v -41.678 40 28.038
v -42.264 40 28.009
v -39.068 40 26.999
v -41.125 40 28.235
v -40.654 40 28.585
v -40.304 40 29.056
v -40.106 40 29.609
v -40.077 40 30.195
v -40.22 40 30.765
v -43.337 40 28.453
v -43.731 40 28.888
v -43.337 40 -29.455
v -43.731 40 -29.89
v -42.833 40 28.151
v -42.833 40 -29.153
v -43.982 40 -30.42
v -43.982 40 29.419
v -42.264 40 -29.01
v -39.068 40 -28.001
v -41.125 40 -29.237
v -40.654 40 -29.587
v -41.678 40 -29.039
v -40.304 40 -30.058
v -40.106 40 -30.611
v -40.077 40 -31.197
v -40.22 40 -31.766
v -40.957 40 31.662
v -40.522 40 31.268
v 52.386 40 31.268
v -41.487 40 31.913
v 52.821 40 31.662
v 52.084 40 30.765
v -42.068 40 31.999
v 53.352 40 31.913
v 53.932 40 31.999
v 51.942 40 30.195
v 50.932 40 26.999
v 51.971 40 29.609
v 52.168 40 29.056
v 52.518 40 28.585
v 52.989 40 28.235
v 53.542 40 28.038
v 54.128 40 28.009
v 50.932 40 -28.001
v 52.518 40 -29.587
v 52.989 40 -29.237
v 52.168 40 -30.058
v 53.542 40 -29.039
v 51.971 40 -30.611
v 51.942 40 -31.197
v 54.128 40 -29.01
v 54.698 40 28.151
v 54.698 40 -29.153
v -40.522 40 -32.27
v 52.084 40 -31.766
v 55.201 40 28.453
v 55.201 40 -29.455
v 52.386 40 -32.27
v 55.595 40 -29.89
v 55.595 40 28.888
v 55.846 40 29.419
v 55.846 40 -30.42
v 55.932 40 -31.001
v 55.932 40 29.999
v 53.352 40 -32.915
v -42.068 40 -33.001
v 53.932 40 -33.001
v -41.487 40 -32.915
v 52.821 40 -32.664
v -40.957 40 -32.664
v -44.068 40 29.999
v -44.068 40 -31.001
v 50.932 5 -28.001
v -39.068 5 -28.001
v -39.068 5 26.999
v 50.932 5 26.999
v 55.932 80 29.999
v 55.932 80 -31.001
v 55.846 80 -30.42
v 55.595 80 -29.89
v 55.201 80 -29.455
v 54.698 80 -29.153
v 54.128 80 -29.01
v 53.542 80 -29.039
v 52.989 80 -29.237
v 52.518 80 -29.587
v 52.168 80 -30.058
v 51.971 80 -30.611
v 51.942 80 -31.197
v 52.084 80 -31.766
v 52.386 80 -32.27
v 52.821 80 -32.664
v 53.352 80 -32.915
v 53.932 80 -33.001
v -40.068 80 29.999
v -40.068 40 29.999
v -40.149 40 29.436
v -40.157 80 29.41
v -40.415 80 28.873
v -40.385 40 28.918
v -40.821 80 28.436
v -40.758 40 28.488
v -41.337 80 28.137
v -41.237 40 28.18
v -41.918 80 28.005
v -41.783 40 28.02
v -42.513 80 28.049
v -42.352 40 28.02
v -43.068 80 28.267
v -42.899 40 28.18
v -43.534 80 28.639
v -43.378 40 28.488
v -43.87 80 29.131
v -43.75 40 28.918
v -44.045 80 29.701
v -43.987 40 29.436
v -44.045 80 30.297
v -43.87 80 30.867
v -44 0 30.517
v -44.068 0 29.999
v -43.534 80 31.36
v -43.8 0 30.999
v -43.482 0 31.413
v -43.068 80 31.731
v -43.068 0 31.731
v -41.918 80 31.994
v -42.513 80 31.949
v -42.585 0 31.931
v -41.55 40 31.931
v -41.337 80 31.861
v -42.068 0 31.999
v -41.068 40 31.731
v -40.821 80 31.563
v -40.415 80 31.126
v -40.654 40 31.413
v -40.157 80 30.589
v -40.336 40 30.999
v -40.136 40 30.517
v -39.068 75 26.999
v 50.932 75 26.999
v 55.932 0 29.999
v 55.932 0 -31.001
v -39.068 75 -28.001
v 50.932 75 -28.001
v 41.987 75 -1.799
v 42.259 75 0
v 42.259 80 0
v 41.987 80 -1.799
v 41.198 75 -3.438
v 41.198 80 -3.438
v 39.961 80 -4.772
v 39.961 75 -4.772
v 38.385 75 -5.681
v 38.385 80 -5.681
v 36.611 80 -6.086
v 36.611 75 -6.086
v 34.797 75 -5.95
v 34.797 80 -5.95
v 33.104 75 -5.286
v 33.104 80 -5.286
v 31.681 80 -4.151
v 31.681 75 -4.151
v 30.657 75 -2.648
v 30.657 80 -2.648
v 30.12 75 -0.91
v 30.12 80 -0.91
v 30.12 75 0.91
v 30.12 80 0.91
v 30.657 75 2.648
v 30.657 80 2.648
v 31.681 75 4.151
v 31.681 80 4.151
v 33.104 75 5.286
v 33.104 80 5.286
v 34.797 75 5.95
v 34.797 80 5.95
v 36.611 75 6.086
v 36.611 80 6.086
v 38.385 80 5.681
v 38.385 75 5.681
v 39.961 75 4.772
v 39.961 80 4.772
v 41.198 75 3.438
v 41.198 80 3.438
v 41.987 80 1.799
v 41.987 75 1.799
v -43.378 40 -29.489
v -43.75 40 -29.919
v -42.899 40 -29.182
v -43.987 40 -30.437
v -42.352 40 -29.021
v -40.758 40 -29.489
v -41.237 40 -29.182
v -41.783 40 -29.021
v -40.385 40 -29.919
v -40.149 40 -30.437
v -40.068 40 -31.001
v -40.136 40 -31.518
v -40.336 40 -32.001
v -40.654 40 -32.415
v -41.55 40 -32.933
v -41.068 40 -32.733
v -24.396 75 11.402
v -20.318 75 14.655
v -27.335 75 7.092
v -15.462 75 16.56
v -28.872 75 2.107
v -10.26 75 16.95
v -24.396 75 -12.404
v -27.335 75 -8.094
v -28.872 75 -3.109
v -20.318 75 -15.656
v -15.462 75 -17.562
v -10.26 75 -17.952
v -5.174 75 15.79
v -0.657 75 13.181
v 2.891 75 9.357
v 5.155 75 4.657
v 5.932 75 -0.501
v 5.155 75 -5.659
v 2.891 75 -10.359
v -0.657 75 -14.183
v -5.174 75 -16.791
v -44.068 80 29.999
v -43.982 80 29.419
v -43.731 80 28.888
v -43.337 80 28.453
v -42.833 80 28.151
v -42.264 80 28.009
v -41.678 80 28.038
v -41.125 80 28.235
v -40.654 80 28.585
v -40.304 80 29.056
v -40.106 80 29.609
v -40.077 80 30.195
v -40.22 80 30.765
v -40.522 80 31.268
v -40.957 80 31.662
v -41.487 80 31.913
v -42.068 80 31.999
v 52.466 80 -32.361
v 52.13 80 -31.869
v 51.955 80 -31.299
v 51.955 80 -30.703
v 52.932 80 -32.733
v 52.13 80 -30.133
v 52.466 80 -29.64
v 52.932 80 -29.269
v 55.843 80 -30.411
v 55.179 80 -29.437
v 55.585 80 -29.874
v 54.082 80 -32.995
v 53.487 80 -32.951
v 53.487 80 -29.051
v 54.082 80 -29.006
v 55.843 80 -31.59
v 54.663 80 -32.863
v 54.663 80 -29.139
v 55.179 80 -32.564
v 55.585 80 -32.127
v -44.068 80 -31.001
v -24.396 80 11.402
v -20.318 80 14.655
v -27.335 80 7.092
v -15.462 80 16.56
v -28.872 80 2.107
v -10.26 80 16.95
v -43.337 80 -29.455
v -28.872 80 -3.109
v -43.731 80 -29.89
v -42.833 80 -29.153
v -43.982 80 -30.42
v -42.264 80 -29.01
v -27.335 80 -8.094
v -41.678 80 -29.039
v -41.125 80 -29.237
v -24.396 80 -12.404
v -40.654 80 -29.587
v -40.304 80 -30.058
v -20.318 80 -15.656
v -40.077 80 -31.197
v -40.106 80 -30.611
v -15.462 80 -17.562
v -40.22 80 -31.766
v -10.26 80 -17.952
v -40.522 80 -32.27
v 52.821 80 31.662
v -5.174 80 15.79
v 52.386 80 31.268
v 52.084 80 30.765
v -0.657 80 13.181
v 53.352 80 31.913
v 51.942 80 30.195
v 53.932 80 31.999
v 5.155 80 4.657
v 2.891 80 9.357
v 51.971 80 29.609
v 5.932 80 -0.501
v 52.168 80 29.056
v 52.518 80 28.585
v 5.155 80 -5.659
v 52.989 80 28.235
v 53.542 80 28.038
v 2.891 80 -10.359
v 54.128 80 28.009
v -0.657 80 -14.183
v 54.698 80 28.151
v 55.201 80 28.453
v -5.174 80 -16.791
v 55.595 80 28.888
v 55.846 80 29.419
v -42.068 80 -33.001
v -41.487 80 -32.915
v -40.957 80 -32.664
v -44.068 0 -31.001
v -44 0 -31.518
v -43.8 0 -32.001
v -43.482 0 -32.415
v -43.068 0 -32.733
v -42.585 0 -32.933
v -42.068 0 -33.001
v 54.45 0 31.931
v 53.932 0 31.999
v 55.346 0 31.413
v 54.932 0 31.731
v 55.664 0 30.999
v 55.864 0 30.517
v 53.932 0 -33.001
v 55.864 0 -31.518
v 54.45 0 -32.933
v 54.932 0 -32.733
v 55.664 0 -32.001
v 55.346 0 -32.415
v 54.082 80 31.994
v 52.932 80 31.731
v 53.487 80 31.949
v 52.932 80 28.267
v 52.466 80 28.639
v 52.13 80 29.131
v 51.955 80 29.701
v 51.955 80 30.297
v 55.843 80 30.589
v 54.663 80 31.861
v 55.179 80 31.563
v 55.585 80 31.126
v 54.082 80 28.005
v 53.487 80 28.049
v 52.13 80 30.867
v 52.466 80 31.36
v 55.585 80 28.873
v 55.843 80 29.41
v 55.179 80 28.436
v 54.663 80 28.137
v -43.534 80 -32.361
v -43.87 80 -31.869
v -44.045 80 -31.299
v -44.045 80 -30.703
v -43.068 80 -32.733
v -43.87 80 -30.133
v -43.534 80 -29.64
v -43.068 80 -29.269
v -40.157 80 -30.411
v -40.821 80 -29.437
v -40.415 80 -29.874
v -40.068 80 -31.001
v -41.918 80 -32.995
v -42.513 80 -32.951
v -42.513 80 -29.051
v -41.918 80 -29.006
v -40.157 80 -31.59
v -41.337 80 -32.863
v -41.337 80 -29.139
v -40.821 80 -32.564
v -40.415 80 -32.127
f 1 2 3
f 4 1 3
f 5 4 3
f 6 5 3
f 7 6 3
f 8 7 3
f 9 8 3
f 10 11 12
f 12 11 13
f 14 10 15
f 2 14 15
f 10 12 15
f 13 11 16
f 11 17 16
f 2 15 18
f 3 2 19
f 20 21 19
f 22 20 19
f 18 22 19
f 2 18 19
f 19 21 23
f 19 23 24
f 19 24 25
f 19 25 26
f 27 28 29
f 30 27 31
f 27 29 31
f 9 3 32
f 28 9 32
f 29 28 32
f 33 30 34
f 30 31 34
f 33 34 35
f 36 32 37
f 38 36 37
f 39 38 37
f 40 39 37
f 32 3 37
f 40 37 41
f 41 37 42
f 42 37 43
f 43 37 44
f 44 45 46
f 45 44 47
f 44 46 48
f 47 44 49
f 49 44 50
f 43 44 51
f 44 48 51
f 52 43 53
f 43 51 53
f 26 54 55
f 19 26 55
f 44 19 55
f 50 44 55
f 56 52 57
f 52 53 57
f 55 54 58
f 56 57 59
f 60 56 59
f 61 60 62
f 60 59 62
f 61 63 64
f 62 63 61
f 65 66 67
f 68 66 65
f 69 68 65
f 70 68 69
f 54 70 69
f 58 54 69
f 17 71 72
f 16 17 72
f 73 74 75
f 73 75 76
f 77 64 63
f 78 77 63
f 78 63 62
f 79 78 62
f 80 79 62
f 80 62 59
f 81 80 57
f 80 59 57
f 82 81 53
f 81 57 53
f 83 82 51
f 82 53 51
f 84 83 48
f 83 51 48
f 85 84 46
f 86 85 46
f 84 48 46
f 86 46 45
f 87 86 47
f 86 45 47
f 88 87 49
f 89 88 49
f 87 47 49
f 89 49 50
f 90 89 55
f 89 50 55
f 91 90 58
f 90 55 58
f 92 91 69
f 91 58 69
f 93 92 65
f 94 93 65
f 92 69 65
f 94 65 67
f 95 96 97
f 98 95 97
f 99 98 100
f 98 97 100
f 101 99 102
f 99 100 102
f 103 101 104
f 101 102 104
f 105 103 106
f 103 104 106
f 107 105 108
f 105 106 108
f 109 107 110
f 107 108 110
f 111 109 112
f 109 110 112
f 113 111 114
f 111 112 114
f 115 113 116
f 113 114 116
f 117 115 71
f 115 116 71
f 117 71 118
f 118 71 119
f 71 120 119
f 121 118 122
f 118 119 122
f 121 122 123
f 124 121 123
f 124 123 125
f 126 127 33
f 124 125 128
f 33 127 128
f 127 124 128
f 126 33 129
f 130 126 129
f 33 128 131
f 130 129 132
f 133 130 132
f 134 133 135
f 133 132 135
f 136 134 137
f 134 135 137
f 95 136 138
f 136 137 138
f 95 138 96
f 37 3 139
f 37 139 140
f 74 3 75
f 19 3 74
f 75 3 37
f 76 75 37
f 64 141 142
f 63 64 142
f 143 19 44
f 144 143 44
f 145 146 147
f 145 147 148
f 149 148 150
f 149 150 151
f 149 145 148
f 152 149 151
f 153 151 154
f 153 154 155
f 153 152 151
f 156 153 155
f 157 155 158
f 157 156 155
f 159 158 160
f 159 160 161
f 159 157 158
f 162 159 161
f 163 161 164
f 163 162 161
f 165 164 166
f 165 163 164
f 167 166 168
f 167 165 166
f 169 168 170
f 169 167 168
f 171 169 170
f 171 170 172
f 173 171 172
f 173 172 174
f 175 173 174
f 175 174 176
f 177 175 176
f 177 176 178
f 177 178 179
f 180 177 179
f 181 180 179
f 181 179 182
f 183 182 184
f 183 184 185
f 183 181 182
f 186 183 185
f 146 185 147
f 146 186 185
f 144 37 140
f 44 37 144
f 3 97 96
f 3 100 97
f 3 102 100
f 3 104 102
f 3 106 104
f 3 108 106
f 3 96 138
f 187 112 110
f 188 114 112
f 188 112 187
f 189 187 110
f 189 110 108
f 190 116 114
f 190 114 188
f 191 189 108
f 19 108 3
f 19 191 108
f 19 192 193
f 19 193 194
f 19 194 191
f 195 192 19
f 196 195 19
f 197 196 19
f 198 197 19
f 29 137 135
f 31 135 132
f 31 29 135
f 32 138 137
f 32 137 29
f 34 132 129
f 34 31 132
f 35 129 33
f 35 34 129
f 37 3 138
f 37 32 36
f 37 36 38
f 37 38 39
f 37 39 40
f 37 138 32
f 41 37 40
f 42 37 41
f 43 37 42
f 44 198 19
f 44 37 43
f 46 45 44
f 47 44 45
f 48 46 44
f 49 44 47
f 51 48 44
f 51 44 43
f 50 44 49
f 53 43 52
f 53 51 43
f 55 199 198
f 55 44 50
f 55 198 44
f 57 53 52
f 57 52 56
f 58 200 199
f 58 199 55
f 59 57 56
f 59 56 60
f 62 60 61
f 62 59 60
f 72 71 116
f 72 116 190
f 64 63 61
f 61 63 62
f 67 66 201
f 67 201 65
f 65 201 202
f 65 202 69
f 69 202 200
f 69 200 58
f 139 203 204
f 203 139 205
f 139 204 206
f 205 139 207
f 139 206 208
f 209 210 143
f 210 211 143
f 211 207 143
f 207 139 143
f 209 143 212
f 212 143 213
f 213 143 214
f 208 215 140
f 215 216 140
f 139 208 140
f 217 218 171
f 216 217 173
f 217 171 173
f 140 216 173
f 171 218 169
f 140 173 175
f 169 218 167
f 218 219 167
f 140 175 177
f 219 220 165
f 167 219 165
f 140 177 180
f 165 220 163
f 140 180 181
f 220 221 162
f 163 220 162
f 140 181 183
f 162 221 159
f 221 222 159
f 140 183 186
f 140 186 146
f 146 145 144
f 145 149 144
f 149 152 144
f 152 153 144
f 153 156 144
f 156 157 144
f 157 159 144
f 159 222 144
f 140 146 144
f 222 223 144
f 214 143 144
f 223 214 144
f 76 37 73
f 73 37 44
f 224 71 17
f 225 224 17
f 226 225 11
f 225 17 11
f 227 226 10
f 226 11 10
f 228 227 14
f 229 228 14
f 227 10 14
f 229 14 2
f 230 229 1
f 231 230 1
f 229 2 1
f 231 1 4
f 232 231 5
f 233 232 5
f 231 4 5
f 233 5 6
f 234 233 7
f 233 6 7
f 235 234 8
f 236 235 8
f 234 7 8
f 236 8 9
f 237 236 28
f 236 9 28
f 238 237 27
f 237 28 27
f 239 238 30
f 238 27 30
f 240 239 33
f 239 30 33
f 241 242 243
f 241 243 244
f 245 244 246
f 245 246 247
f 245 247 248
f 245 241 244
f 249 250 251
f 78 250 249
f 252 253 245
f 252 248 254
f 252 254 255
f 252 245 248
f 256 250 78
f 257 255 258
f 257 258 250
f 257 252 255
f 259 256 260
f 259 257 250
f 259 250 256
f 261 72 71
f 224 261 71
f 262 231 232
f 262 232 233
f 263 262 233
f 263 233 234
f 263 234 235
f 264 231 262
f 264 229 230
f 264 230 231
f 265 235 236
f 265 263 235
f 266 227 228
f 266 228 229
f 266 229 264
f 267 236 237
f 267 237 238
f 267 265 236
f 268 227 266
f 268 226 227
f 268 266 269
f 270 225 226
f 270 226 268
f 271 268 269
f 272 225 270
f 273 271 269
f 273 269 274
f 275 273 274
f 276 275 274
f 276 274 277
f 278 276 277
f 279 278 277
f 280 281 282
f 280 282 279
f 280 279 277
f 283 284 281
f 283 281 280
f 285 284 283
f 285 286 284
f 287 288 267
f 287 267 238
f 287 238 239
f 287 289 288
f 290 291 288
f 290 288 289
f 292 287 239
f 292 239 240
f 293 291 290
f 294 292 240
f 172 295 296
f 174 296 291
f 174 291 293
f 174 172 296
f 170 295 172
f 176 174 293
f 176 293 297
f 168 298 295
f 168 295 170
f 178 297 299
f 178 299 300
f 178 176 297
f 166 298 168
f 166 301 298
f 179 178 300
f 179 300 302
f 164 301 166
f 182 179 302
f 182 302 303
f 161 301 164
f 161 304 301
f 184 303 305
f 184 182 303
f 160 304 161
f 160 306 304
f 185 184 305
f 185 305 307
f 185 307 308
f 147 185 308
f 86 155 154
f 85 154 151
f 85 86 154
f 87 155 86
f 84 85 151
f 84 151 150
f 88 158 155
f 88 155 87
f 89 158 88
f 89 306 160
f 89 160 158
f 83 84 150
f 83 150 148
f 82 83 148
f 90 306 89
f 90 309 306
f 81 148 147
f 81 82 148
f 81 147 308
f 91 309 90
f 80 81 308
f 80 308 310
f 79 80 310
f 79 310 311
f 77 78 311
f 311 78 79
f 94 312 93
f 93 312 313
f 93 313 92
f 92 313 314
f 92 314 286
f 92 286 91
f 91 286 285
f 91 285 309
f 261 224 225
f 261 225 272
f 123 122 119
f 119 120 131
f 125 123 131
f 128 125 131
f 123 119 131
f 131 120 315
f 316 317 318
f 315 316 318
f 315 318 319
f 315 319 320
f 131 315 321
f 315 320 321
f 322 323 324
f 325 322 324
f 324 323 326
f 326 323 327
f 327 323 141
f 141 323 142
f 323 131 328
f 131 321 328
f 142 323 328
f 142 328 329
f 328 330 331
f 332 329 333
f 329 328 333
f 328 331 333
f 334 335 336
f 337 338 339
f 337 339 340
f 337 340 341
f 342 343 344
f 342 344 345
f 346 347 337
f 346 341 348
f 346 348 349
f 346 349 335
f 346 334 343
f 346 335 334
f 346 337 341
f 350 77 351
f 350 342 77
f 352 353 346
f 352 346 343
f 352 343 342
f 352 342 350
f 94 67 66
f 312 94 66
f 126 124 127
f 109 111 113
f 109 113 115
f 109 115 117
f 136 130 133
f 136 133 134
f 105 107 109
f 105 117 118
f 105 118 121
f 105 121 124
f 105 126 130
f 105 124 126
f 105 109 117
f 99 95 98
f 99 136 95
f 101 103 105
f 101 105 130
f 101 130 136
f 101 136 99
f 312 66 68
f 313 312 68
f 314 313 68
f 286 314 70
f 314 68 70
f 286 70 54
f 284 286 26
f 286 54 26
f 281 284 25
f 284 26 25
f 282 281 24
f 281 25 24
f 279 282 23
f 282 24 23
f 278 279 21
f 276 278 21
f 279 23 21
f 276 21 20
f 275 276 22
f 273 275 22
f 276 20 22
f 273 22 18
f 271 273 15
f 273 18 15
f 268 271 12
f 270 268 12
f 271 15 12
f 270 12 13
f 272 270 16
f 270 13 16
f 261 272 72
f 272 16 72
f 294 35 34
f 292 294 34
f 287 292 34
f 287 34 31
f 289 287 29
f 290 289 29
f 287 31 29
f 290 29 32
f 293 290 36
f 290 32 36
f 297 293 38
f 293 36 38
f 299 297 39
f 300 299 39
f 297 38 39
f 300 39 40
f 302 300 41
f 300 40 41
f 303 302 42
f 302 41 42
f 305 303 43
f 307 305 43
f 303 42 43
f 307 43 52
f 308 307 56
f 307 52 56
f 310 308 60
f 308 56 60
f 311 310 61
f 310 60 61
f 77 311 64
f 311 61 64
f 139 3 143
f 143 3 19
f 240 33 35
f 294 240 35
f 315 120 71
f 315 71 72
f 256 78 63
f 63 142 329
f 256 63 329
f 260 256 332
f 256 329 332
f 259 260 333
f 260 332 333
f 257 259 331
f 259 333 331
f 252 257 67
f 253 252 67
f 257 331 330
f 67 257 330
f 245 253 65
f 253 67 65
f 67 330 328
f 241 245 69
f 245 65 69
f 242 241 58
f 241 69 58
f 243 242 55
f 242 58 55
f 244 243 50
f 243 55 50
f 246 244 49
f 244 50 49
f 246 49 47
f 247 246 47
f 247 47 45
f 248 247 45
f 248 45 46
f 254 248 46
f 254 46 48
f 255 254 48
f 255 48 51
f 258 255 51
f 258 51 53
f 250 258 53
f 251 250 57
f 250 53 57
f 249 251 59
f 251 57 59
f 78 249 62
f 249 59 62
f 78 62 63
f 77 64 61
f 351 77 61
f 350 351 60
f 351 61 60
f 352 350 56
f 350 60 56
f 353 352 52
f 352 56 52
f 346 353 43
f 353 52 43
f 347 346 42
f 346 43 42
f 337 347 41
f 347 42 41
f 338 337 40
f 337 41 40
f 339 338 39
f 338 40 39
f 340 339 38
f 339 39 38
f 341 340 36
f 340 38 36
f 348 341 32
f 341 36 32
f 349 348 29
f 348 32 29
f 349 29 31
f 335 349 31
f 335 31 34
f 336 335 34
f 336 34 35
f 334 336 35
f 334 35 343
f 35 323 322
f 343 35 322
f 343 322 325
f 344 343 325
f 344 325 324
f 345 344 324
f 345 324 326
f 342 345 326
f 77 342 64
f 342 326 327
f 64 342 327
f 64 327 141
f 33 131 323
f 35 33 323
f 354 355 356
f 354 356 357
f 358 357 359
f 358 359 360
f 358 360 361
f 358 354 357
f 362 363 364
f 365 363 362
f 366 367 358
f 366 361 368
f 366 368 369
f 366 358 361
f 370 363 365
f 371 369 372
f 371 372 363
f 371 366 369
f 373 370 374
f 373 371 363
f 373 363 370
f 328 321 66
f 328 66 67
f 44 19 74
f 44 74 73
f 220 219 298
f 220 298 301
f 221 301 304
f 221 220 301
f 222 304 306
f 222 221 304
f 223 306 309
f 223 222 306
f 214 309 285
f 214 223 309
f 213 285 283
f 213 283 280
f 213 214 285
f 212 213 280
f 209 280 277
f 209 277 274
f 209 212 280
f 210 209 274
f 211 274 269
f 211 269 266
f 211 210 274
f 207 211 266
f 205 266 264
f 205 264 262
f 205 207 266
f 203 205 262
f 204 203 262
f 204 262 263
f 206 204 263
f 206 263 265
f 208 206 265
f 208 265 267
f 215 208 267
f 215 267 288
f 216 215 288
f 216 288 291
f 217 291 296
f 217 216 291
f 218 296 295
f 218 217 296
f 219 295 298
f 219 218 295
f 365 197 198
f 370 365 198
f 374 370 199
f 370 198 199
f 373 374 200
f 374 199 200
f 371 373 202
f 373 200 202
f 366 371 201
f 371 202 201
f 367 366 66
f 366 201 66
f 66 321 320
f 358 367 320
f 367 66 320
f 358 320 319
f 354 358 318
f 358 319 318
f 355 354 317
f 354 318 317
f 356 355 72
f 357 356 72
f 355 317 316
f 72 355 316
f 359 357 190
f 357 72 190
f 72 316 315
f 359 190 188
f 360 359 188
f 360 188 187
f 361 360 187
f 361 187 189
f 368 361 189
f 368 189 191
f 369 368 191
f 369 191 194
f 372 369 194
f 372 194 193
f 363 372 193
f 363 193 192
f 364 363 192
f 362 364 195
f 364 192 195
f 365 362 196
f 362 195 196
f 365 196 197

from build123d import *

# Parameters (mm, degrees)
SKETCH1_W             = 100
SKETCH1_H             = 65
BOSS_EXTRUDE1_DEPTH   = 80
SKETCH2_W             = 90
SKETCH2_H             = 55
CUT_EXTRUDE2_DEPTH    = 75
SKETCH4_W             = 90
SKETCH4_H             = 55
BOSS_EXTRUDE2_DEPTH   = 5
SKETCH3_R             = 17.5
CUT_EXTRUDE3_DEPTH    = 5
SKETCH5_R             = 6.10322586
CUT_EXTRUDE4_DEPTH    = 5
SPLIT1_START          = -1
SPLIT1_DEPTH          = 82
SPLIT1_2_OUTLINE_R    = 2
SPLIT1_2_DEPTH        = 80
SPLIT1_3_OUTLINE_R    = 2
SPLIT1_3_DEPTH        = 80
SPLIT1_4_OUTLINE_R    = 2
SPLIT1_4_DEPTH        = 80
SPLIT1_5_OUTLINE_R    = 2
SPLIT1_5_DEPTH        = 80
SPLIT1_6_DEPTH        = 80
SPLIT1_7_DEPTH        = 80
SPLIT1_8_DEPTH        = 80
SPLIT1_9_DEPTH        = 80
SPLIT2_START          = 40
SPLIT2_OUTLINE_W      = 90
SPLIT2_OUTLINE_H      = 55
SPLIT2_DEPTH          = 40
SPLIT2_START_2        = 75
SPLIT2_2_OUTLINE_W    = 90
SPLIT2_2_OUTLINE_H    = 55
SPLIT2_2_OUTLINE_R    = 6.10322586
SPLIT2_2_OUTLINE_R_2  = 17.5
SPLIT2_2_DEPTH        = 5
SPLIT2_3_OUTLINE_R    = 2
SPLIT2_3_DEPTH        = 40
SPLIT2_4_OUTLINE_R    = 2
SPLIT2_4_DEPTH        = 40
SPLIT2_5_OUTLINE_R    = 2
SPLIT2_5_DEPTH        = 40
SPLIT2_6_OUTLINE_R    = 2
SPLIT2_6_DEPTH        = 40
SPLIT2_7_OUTLINE_R    = 2
SPLIT2_7_DEPTH        = 40
SPLIT2_8_OUTLINE_R    = 2
SPLIT2_8_DEPTH        = 40
SPLIT2_9_OUTLINE_R    = 2
SPLIT2_9_DEPTH        = 40
SPLIT2_10_OUTLINE_R   = 2
SPLIT2_10_DEPTH       = 40
SPLIT2_11_OUTLINE_R   = 6.10322586
SPLIT2_11_OUTLINE_R_2 = 17.5
SPLIT2_11_DEPTH       = 40


with BuildPart() as part:
    # Sketch1 → Boss-Extrude1 (new body)
    with BuildSketch(Plane(origin=(0, 0, 0), x_dir=(1, 0, 0), z_dir=(0, 1, 0))):
        with Locations((5.93220339, 0.500770416)):
            Rectangle(SKETCH1_W, SKETCH1_H)
    extrude(amount=BOSS_EXTRUDE1_DEPTH)

    # Sketch2 → Cut-Extrude2 (cut)
    with BuildSketch(Plane(origin=(0, 80, 0), x_dir=(1, 0, 0), z_dir=(0, 1, 0))):
        with Locations((5.93220339, 0.500770416)):
            Rectangle(SKETCH2_W, SKETCH2_H)
    extrude(amount=-CUT_EXTRUDE2_DEPTH, mode=Mode.SUBTRACT)

    # Sketch4 → Boss-Extrude2 (add)
    with BuildSketch(Plane(origin=(0, 80, 0), x_dir=(1, 0, 0), z_dir=(0, 1, 0))):
        with Locations((5.93220339, 0.500770416)):
            Rectangle(SKETCH4_W, SKETCH4_H)
    extrude(amount=-BOSS_EXTRUDE2_DEPTH)

    # Sketch3 → Cut-Extrude3 (cut)
    with BuildSketch(Plane(origin=(0, 80, 0), x_dir=(1, 0, 0), z_dir=(0, 1, 0))):
        with Locations(Location((-11.56779661, 0.500770416, 0), (0, 0, 270))):
            Circle(SKETCH3_R)
    extrude(amount=-CUT_EXTRUDE3_DEPTH, mode=Mode.SUBTRACT)

    # Sketch5 → Cut-Extrude4 (cut)
    with BuildSketch(Plane(origin=(0, 80, 0), x_dir=(1, 0, 0), z_dir=(0, 1, 0))):
        with Locations(Location((36.155377847, 0, 0), (0, 0, 270))):
            Circle(SKETCH5_R)
    extrude(amount=-CUT_EXTRUDE4_DEPTH, mode=Mode.SUBTRACT)

    # Split1: read off the stored shape, not the designer's step
    # Split1 outline → Split1 (cut)
    with BuildSketch(Plane(origin=(0, 0, 0), x_dir=(1, 0, 0), z_dir=(0, 1, 0)).offset(SPLIT1_START)):
        with BuildLine():
            Line((-44.06779661, 33.000770416), (-44.06779661, 31.000770416))
            ThreePointArc((-44.06779661, 31.000770416), (-40.653583048, 29.586556854), (-42.06779661, 33.000770416))
            Line((-42.06779661, 33.000770416), (-44.06779661, 33.000770416))
        make_face()
        with BuildLine():
            ThreePointArc((-42.06779661, -31.999229584), (-40.653583048, -28.585016022), (-44.06779661, -29.999229584))
            Line((-44.06779661, -29.999229584), (-44.06779661, -31.999229584))
            Line((-44.06779661, -31.999229584), (-42.06779661, -31.999229584))
        make_face()
        with BuildLine():
            Line((55.93220339, 33.000770416), (53.93220339, 33.000770416))
            ThreePointArc((53.93220339, 33.000770416), (52.517989827, 29.586556854), (55.93220339, 31.000770416))
            Line((55.93220339, 31.000770416), (55.93220339, 33.000770416))
        make_face()
        with BuildLine():
            ThreePointArc((55.93220339, -29.999229584), (52.517989827, -28.585016021), (53.93220339, -31.999229584))
            Line((53.93220339, -31.999229584), (55.93220339, -31.999229584))
            Line((55.93220339, -31.999229584), (55.93220339, -29.999229584))
        make_face()
    extrude(amount=SPLIT1_DEPTH, mode=Mode.SUBTRACT)

    # Split2 11 outline → Split2 11 (cut)
    with BuildSketch(Plane(origin=(0, 0, 0), x_dir=(1, 0, 0), z_dir=(0, 1, 0)).offset(SPLIT2_START)):
        with BuildLine():
            ThreePointArc((-42.06779661, 33.000770416), (-40.653583048, 29.586556854), (-44.06779661, 31.000770416))
            Line((-44.06779661, 31.000770416), (-44.06779661, -29.999229584))
            ThreePointArc((-44.06779661, -29.999229584), (-40.653583048, -28.585016022), (-42.06779661, -31.999229584))
            Line((-42.06779661, -31.999229584), (53.93220339, -31.999229584))
            ThreePointArc((53.93220339, -31.999229584), (52.517989827, -28.585016021), (55.93220339, -29.999229584))
            Line((55.93220339, -29.999229584), (55.93220339, 31.000770416))
            ThreePointArc((55.93220339, 31.000770416), (52.517989827, 29.586556854), (53.93220339, 33.000770416))
            Line((53.93220339, 33.000770416), (-42.06779661, 33.000770416))
        make_face()
        with Locations((36.155377847, 0)):
            Circle(SPLIT2_11_OUTLINE_R, mode=Mode.SUBTRACT)
        with Locations((-11.56779661, 0.500770416)):
            Circle(SPLIT2_11_OUTLINE_R_2, mode=Mode.SUBTRACT)
    extrude(amount=SPLIT2_11_DEPTH, mode=Mode.SUBTRACT)


with BuildPart() as body_2:
    # Split1 2 outline → Split1 2 (new body)
    with BuildSketch(Plane(origin=(0, 0, 0), x_dir=(1, 0, 0), z_dir=(0, 1, 0))):
        with Locations((53.93220339, 31.000770416)):
            Circle(SPLIT1_2_OUTLINE_R)
    extrude(amount=SPLIT1_2_DEPTH)

    # Split2 9 outline → Split2 9 (cut)
    with BuildSketch(Plane(origin=(0, 0, 0), x_dir=(1, 0, 0), z_dir=(0, 1, 0))):
        with Locations((53.93220339, 31.000770416)):
            Circle(SPLIT2_9_OUTLINE_R)
    extrude(amount=SPLIT2_9_DEPTH, mode=Mode.SUBTRACT)


with BuildPart() as body_3:
    # Split1 3 outline → Split1 3 (new body)
    with BuildSketch(Plane(origin=(0, 0, 0), x_dir=(1, 0, 0), z_dir=(0, 1, 0))):
        with Locations((-42.06779661, -29.999229584)):
            Circle(SPLIT1_3_OUTLINE_R)
    extrude(amount=SPLIT1_3_DEPTH)

    # Split2 3 outline → Split2 3 (cut)
    with BuildSketch(Plane(origin=(0, 0, 0), x_dir=(1, 0, 0), z_dir=(0, 1, 0)).offset(SPLIT2_START)):
        with Locations((-42.06779661, -29.999229584)):
            Circle(SPLIT2_3_OUTLINE_R)
    extrude(amount=SPLIT2_3_DEPTH, mode=Mode.SUBTRACT)


with BuildPart() as body_4:
    # Split1 4 outline → Split1 4 (new body)
    with BuildSketch(Plane(origin=(0, 0, 0), x_dir=(1, 0, 0), z_dir=(0, 1, 0))):
        with Locations((53.93220339, -29.999229584)):
            Circle(SPLIT1_4_OUTLINE_R)
    extrude(amount=SPLIT1_4_DEPTH)

    # Split2 6 outline → Split2 6 (cut)
    with BuildSketch(Plane(origin=(0, 0, 0), x_dir=(1, 0, 0), z_dir=(0, 1, 0))):
        with Locations((53.93220339, -29.999229584)):
            Circle(SPLIT2_6_OUTLINE_R)
    extrude(amount=SPLIT2_6_DEPTH, mode=Mode.SUBTRACT)


with BuildPart() as body_5:
    # Split1 5 outline → Split1 5 (new body)
    with BuildSketch(Plane(origin=(0, 0, 0), x_dir=(1, 0, 0), z_dir=(0, 1, 0))):
        with Locations((-42.06779661, 31.000770416)):
            Circle(SPLIT1_5_OUTLINE_R)
    extrude(amount=SPLIT1_5_DEPTH)

    # Split2 4 outline → Split2 4 (cut)
    with BuildSketch(Plane(origin=(0, 0, 0), x_dir=(1, 0, 0), z_dir=(0, 1, 0))):
        with Locations((-42.06779661, 31.000770416)):
            Circle(SPLIT2_4_OUTLINE_R)
    extrude(amount=SPLIT2_4_DEPTH, mode=Mode.SUBTRACT)


with BuildPart() as body_6:
    # Split1 6 outline → Split1 6 (new body)
    with BuildSketch(Plane(origin=(0, 0, 0), x_dir=(1, 0, 0), z_dir=(0, 1, 0))):
        with BuildLine():
            ThreePointArc((-42.06779661, -31.999229584), (-43.482010173, -31.413443146), (-44.06779661, -29.999229584))
            Line((-44.06779661, -29.999229584), (-44.06779661, -31.999229584))
            Line((-44.06779661, -31.999229584), (-42.06779661, -31.999229584))
        make_face()
    extrude(amount=SPLIT1_6_DEPTH)


with BuildPart() as body_7:
    # Split1 7 outline → Split1 7 (new body)
    with BuildSketch(Plane(origin=(0, 0, 0), x_dir=(1, 0, 0), z_dir=(0, 1, 0))):
        with BuildLine():
            ThreePointArc((-44.06779661, 31.000770416), (-43.482010173, 32.414983978), (-42.06779661, 33.000770416))
            Line((-42.06779661, 33.000770416), (-44.06779661, 33.000770416))
            Line((-44.06779661, 33.000770416), (-44.06779661, 31.000770416))
        make_face()
    extrude(amount=SPLIT1_7_DEPTH)


with BuildPart() as body_8:
    # Split1 8 outline → Split1 8 (new body)
    with BuildSketch(Plane(origin=(0, 0, 0), x_dir=(1, 0, 0), z_dir=(0, 1, 0))):
        with BuildLine():
            ThreePointArc((55.93220339, -29.999229584), (55.346416952, -31.413443146), (53.93220339, -31.999229584))
            Line((53.93220339, -31.999229584), (55.93220339, -31.999229584))
            Line((55.93220339, -31.999229584), (55.93220339, -29.999229584))
        make_face()
    extrude(amount=SPLIT1_8_DEPTH)


with BuildPart() as body_9:
    # Split1 9 outline → Split1 9 (new body)
    with BuildSketch(Plane(origin=(0, 0, 0), x_dir=(1, 0, 0), z_dir=(0, 1, 0))):
        with BuildLine():
            ThreePointArc((53.93220339, 33.000770416), (55.346416952, 32.414983978), (55.93220339, 31.000770416))
            Line((55.93220339, 31.000770416), (55.93220339, 33.000770416))
            Line((55.93220339, 33.000770416), (53.93220339, 33.000770416))
        make_face()
    extrude(amount=SPLIT1_9_DEPTH)


with BuildPart() as body_6_2:
    # Split2: read off the stored shape, not the designer's step
    # Split2 outline → Split2 (new body)
    with BuildSketch(Plane(origin=(0, 0, 0), x_dir=(1, 0, 0), z_dir=(0, 1, 0)).offset(SPLIT2_START)):
        with BuildLine():
            Line((55.93220339, -29.999229584), (55.93220339, 31.000770416))
            ThreePointArc((55.93220339, 31.000770416), (52.517989827, 29.586556854), (53.93220339, 33.000770416))
            Line((53.93220339, 33.000770416), (-42.06779661, 33.000770416))
            ThreePointArc((-42.06779661, 33.000770416), (-40.653583048, 29.586556854), (-44.06779661, 31.000770416))
            Line((-44.06779661, 31.000770416), (-44.06779661, -29.999229584))
            ThreePointArc((-44.06779661, -29.999229584), (-40.653583048, -28.585016022), (-42.06779661, -31.999229584))
            Line((-42.06779661, -31.999229584), (53.93220339, -31.999229584))
            ThreePointArc((53.93220339, -31.999229584), (52.517989827, -28.585016021), (55.93220339, -29.999229584))
        make_face()
        with Locations((5.93220339, 0.500770416)):
            Rectangle(SPLIT2_OUTLINE_W, SPLIT2_OUTLINE_H, mode=Mode.SUBTRACT)
    extrude(amount=SPLIT2_DEPTH)

    # Split2 2 outline → Split2 2 (add)
    with BuildSketch(Plane(origin=(0, 0, 0), x_dir=(1, 0, 0), z_dir=(0, 1, 0)).offset(SPLIT2_START_2)):
        with Locations((5.93220339, 0.500770416)):
            Rectangle(SPLIT2_2_OUTLINE_W, SPLIT2_2_OUTLINE_H)
        with Locations((36.155377847, 0)):
            Circle(SPLIT2_2_OUTLINE_R, mode=Mode.SUBTRACT)
        with Locations((-11.56779661, 0.500770416)):
            Circle(SPLIT2_2_OUTLINE_R_2, mode=Mode.SUBTRACT)
    extrude(amount=SPLIT2_2_DEPTH)


with BuildPart() as body_7_2:
    # Split2 5 outline → Split2 5 (new body)
    with BuildSketch(Plane(origin=(0, 0, 0), x_dir=(1, 0, 0), z_dir=(0, 1, 0))):
        with Locations((-42.06779661, 31.000770416)):
            Circle(SPLIT2_5_OUTLINE_R)
    extrude(amount=SPLIT2_5_DEPTH)


with BuildPart() as body_8_2:
    # Split2 7 outline → Split2 7 (new body)
    with BuildSketch(Plane(origin=(0, 0, 0), x_dir=(1, 0, 0), z_dir=(0, 1, 0)).offset(SPLIT2_START)):
        with Locations((-42.06779661, -29.999229584)):
            Circle(SPLIT2_7_OUTLINE_R)
    extrude(amount=SPLIT2_7_DEPTH)


with BuildPart() as body_9_2:
    # Split2 8 outline → Split2 8 (new body)
    with BuildSketch(Plane(origin=(0, 0, 0), x_dir=(1, 0, 0), z_dir=(0, 1, 0))):
        with Locations((53.93220339, -29.999229584)):
            Circle(SPLIT2_8_OUTLINE_R)
    extrude(amount=SPLIT2_8_DEPTH)


with BuildPart() as body_10:
    # Split2 10 outline → Split2 10 (new body)
    with BuildSketch(Plane(origin=(0, 0, 0), x_dir=(1, 0, 0), z_dir=(0, 1, 0))):
        with Locations((53.93220339, 31.000770416)):
            Circle(SPLIT2_10_OUTLINE_R)
    extrude(amount=SPLIT2_10_DEPTH)


with BuildPart() as part_1:
    add(part.part)

    # Combine1: read off the stored shape, not the designer's step
    # Combine1: union body 3, body 5, body 7 2, body 4, body 8 2, body 9 2, body 2, body 10
    add(body_3.part)
    add(body_5.part)
    add(body_7_2.part)
    add(body_4.part)
    add(body_8_2.part)
    add(body_9_2.part)
    add(body_2.part)
    add(body_10.part)


solid = Compound([body_6_2.part, part_1.part])
